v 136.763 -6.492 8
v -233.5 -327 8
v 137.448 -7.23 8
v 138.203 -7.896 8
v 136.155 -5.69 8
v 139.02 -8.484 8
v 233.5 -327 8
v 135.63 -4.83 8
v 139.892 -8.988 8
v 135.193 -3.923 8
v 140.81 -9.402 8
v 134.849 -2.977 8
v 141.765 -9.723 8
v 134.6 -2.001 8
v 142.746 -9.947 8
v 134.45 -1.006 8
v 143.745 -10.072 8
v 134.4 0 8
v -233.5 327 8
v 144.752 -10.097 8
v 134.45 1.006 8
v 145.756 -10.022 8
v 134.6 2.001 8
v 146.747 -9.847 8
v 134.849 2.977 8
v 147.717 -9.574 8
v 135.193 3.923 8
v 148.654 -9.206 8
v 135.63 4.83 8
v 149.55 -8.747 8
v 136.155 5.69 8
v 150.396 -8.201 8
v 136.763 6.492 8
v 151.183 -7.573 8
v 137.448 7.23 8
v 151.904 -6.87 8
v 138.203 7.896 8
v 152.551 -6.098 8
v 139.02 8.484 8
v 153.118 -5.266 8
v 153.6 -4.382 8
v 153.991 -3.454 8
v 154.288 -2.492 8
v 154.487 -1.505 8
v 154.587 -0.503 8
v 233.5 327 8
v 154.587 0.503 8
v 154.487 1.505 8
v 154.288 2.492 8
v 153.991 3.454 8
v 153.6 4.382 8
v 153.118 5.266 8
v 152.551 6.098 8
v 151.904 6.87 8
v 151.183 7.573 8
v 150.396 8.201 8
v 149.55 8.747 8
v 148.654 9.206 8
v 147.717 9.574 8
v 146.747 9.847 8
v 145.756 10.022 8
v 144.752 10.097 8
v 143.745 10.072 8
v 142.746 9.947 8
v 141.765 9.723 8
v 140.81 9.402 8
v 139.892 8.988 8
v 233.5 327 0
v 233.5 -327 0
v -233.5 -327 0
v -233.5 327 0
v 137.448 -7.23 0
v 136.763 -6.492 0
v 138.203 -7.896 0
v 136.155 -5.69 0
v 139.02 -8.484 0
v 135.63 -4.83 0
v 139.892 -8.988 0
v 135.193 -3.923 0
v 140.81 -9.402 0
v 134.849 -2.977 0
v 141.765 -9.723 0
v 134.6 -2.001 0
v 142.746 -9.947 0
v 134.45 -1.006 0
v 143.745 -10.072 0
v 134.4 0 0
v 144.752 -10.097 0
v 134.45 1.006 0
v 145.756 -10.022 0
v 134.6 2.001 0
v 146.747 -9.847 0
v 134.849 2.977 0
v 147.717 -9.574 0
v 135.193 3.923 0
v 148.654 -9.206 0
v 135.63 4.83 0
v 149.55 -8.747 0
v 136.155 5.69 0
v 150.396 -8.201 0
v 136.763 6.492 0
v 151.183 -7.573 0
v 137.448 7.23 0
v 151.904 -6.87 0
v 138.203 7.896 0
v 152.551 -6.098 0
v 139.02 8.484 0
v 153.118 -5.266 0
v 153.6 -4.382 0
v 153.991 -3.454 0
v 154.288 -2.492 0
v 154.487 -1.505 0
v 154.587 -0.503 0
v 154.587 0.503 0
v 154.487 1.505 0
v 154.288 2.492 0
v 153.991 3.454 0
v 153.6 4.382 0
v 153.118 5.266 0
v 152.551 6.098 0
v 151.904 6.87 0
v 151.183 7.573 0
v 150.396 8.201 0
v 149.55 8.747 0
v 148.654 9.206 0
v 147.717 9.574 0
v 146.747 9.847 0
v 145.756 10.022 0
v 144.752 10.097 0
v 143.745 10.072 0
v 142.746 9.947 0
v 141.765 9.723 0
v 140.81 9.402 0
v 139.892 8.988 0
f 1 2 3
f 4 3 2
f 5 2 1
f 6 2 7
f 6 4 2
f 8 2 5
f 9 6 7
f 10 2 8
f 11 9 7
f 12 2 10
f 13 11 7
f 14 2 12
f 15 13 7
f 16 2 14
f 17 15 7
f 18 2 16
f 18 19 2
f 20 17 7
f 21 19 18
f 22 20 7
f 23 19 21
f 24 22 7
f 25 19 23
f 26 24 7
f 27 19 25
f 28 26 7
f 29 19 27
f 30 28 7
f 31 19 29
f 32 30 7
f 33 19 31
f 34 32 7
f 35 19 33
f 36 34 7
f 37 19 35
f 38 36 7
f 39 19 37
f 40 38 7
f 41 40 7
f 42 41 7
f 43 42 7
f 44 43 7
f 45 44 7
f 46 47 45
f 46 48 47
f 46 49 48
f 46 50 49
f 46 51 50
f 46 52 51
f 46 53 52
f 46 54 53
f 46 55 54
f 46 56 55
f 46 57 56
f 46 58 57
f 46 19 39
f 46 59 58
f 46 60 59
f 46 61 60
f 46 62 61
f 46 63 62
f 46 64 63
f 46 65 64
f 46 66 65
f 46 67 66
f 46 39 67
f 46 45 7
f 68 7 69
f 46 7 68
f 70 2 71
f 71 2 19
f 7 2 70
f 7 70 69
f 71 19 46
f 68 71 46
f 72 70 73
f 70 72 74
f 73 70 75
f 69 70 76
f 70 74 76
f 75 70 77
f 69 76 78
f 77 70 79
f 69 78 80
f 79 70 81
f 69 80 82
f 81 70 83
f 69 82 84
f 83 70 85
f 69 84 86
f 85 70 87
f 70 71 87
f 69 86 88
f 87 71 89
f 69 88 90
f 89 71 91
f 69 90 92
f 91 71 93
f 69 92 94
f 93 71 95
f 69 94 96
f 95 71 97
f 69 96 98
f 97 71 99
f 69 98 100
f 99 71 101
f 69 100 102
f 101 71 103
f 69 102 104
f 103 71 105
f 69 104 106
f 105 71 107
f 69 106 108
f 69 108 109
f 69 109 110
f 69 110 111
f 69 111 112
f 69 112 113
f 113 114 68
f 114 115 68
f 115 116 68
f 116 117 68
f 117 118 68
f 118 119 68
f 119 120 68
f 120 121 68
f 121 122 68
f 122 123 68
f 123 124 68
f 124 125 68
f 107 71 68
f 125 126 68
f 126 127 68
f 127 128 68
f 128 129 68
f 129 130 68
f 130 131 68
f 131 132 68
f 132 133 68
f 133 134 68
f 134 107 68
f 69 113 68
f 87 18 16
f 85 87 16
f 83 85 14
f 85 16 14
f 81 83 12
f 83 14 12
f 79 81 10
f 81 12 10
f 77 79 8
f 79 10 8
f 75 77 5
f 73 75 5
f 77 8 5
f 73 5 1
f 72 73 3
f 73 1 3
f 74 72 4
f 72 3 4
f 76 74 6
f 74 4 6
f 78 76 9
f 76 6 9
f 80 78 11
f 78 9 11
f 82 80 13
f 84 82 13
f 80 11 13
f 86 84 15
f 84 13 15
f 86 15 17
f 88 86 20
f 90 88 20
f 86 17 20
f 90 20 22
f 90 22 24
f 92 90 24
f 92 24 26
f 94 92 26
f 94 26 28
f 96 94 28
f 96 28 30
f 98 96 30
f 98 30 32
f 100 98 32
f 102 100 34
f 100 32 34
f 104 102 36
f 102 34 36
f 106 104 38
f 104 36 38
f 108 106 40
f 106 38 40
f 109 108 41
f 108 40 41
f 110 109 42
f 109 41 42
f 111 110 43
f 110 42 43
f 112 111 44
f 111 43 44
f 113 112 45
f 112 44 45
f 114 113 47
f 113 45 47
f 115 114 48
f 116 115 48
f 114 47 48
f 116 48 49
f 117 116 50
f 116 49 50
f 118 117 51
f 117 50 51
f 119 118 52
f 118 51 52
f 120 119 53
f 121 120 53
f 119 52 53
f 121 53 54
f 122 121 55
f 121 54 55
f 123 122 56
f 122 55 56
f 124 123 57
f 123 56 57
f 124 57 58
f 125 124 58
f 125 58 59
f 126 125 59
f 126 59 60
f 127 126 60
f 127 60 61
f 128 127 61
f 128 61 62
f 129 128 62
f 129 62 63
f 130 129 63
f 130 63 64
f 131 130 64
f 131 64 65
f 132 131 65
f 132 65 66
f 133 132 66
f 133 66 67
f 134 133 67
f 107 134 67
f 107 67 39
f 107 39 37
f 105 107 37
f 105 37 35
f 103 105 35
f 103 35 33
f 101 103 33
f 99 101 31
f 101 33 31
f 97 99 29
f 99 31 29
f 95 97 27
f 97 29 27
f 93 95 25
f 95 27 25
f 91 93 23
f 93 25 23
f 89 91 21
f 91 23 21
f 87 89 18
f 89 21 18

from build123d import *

# Parameters (mm, degrees)
SKETCH1_W           = 467
SKETCH1_H           = 654
SKETCH1_R           = 10.1
BOSS_EXTRUDE1_DEPTH = 8


with BuildPart() as part:
    # Sketch1 → Boss-Extrude1 (new body)
    with BuildSketch(Plane.XY.offset(8)):
        Rectangle(SKETCH1_W, SKETCH1_H)
        with Locations(Location((144.5, 0, 0), (0, 0, 180))):
            Circle(SKETCH1_R, mode=Mode.SUBTRACT)
    extrude(amount=-BOSS_EXTRUDE1_DEPTH)


solid = part.part
